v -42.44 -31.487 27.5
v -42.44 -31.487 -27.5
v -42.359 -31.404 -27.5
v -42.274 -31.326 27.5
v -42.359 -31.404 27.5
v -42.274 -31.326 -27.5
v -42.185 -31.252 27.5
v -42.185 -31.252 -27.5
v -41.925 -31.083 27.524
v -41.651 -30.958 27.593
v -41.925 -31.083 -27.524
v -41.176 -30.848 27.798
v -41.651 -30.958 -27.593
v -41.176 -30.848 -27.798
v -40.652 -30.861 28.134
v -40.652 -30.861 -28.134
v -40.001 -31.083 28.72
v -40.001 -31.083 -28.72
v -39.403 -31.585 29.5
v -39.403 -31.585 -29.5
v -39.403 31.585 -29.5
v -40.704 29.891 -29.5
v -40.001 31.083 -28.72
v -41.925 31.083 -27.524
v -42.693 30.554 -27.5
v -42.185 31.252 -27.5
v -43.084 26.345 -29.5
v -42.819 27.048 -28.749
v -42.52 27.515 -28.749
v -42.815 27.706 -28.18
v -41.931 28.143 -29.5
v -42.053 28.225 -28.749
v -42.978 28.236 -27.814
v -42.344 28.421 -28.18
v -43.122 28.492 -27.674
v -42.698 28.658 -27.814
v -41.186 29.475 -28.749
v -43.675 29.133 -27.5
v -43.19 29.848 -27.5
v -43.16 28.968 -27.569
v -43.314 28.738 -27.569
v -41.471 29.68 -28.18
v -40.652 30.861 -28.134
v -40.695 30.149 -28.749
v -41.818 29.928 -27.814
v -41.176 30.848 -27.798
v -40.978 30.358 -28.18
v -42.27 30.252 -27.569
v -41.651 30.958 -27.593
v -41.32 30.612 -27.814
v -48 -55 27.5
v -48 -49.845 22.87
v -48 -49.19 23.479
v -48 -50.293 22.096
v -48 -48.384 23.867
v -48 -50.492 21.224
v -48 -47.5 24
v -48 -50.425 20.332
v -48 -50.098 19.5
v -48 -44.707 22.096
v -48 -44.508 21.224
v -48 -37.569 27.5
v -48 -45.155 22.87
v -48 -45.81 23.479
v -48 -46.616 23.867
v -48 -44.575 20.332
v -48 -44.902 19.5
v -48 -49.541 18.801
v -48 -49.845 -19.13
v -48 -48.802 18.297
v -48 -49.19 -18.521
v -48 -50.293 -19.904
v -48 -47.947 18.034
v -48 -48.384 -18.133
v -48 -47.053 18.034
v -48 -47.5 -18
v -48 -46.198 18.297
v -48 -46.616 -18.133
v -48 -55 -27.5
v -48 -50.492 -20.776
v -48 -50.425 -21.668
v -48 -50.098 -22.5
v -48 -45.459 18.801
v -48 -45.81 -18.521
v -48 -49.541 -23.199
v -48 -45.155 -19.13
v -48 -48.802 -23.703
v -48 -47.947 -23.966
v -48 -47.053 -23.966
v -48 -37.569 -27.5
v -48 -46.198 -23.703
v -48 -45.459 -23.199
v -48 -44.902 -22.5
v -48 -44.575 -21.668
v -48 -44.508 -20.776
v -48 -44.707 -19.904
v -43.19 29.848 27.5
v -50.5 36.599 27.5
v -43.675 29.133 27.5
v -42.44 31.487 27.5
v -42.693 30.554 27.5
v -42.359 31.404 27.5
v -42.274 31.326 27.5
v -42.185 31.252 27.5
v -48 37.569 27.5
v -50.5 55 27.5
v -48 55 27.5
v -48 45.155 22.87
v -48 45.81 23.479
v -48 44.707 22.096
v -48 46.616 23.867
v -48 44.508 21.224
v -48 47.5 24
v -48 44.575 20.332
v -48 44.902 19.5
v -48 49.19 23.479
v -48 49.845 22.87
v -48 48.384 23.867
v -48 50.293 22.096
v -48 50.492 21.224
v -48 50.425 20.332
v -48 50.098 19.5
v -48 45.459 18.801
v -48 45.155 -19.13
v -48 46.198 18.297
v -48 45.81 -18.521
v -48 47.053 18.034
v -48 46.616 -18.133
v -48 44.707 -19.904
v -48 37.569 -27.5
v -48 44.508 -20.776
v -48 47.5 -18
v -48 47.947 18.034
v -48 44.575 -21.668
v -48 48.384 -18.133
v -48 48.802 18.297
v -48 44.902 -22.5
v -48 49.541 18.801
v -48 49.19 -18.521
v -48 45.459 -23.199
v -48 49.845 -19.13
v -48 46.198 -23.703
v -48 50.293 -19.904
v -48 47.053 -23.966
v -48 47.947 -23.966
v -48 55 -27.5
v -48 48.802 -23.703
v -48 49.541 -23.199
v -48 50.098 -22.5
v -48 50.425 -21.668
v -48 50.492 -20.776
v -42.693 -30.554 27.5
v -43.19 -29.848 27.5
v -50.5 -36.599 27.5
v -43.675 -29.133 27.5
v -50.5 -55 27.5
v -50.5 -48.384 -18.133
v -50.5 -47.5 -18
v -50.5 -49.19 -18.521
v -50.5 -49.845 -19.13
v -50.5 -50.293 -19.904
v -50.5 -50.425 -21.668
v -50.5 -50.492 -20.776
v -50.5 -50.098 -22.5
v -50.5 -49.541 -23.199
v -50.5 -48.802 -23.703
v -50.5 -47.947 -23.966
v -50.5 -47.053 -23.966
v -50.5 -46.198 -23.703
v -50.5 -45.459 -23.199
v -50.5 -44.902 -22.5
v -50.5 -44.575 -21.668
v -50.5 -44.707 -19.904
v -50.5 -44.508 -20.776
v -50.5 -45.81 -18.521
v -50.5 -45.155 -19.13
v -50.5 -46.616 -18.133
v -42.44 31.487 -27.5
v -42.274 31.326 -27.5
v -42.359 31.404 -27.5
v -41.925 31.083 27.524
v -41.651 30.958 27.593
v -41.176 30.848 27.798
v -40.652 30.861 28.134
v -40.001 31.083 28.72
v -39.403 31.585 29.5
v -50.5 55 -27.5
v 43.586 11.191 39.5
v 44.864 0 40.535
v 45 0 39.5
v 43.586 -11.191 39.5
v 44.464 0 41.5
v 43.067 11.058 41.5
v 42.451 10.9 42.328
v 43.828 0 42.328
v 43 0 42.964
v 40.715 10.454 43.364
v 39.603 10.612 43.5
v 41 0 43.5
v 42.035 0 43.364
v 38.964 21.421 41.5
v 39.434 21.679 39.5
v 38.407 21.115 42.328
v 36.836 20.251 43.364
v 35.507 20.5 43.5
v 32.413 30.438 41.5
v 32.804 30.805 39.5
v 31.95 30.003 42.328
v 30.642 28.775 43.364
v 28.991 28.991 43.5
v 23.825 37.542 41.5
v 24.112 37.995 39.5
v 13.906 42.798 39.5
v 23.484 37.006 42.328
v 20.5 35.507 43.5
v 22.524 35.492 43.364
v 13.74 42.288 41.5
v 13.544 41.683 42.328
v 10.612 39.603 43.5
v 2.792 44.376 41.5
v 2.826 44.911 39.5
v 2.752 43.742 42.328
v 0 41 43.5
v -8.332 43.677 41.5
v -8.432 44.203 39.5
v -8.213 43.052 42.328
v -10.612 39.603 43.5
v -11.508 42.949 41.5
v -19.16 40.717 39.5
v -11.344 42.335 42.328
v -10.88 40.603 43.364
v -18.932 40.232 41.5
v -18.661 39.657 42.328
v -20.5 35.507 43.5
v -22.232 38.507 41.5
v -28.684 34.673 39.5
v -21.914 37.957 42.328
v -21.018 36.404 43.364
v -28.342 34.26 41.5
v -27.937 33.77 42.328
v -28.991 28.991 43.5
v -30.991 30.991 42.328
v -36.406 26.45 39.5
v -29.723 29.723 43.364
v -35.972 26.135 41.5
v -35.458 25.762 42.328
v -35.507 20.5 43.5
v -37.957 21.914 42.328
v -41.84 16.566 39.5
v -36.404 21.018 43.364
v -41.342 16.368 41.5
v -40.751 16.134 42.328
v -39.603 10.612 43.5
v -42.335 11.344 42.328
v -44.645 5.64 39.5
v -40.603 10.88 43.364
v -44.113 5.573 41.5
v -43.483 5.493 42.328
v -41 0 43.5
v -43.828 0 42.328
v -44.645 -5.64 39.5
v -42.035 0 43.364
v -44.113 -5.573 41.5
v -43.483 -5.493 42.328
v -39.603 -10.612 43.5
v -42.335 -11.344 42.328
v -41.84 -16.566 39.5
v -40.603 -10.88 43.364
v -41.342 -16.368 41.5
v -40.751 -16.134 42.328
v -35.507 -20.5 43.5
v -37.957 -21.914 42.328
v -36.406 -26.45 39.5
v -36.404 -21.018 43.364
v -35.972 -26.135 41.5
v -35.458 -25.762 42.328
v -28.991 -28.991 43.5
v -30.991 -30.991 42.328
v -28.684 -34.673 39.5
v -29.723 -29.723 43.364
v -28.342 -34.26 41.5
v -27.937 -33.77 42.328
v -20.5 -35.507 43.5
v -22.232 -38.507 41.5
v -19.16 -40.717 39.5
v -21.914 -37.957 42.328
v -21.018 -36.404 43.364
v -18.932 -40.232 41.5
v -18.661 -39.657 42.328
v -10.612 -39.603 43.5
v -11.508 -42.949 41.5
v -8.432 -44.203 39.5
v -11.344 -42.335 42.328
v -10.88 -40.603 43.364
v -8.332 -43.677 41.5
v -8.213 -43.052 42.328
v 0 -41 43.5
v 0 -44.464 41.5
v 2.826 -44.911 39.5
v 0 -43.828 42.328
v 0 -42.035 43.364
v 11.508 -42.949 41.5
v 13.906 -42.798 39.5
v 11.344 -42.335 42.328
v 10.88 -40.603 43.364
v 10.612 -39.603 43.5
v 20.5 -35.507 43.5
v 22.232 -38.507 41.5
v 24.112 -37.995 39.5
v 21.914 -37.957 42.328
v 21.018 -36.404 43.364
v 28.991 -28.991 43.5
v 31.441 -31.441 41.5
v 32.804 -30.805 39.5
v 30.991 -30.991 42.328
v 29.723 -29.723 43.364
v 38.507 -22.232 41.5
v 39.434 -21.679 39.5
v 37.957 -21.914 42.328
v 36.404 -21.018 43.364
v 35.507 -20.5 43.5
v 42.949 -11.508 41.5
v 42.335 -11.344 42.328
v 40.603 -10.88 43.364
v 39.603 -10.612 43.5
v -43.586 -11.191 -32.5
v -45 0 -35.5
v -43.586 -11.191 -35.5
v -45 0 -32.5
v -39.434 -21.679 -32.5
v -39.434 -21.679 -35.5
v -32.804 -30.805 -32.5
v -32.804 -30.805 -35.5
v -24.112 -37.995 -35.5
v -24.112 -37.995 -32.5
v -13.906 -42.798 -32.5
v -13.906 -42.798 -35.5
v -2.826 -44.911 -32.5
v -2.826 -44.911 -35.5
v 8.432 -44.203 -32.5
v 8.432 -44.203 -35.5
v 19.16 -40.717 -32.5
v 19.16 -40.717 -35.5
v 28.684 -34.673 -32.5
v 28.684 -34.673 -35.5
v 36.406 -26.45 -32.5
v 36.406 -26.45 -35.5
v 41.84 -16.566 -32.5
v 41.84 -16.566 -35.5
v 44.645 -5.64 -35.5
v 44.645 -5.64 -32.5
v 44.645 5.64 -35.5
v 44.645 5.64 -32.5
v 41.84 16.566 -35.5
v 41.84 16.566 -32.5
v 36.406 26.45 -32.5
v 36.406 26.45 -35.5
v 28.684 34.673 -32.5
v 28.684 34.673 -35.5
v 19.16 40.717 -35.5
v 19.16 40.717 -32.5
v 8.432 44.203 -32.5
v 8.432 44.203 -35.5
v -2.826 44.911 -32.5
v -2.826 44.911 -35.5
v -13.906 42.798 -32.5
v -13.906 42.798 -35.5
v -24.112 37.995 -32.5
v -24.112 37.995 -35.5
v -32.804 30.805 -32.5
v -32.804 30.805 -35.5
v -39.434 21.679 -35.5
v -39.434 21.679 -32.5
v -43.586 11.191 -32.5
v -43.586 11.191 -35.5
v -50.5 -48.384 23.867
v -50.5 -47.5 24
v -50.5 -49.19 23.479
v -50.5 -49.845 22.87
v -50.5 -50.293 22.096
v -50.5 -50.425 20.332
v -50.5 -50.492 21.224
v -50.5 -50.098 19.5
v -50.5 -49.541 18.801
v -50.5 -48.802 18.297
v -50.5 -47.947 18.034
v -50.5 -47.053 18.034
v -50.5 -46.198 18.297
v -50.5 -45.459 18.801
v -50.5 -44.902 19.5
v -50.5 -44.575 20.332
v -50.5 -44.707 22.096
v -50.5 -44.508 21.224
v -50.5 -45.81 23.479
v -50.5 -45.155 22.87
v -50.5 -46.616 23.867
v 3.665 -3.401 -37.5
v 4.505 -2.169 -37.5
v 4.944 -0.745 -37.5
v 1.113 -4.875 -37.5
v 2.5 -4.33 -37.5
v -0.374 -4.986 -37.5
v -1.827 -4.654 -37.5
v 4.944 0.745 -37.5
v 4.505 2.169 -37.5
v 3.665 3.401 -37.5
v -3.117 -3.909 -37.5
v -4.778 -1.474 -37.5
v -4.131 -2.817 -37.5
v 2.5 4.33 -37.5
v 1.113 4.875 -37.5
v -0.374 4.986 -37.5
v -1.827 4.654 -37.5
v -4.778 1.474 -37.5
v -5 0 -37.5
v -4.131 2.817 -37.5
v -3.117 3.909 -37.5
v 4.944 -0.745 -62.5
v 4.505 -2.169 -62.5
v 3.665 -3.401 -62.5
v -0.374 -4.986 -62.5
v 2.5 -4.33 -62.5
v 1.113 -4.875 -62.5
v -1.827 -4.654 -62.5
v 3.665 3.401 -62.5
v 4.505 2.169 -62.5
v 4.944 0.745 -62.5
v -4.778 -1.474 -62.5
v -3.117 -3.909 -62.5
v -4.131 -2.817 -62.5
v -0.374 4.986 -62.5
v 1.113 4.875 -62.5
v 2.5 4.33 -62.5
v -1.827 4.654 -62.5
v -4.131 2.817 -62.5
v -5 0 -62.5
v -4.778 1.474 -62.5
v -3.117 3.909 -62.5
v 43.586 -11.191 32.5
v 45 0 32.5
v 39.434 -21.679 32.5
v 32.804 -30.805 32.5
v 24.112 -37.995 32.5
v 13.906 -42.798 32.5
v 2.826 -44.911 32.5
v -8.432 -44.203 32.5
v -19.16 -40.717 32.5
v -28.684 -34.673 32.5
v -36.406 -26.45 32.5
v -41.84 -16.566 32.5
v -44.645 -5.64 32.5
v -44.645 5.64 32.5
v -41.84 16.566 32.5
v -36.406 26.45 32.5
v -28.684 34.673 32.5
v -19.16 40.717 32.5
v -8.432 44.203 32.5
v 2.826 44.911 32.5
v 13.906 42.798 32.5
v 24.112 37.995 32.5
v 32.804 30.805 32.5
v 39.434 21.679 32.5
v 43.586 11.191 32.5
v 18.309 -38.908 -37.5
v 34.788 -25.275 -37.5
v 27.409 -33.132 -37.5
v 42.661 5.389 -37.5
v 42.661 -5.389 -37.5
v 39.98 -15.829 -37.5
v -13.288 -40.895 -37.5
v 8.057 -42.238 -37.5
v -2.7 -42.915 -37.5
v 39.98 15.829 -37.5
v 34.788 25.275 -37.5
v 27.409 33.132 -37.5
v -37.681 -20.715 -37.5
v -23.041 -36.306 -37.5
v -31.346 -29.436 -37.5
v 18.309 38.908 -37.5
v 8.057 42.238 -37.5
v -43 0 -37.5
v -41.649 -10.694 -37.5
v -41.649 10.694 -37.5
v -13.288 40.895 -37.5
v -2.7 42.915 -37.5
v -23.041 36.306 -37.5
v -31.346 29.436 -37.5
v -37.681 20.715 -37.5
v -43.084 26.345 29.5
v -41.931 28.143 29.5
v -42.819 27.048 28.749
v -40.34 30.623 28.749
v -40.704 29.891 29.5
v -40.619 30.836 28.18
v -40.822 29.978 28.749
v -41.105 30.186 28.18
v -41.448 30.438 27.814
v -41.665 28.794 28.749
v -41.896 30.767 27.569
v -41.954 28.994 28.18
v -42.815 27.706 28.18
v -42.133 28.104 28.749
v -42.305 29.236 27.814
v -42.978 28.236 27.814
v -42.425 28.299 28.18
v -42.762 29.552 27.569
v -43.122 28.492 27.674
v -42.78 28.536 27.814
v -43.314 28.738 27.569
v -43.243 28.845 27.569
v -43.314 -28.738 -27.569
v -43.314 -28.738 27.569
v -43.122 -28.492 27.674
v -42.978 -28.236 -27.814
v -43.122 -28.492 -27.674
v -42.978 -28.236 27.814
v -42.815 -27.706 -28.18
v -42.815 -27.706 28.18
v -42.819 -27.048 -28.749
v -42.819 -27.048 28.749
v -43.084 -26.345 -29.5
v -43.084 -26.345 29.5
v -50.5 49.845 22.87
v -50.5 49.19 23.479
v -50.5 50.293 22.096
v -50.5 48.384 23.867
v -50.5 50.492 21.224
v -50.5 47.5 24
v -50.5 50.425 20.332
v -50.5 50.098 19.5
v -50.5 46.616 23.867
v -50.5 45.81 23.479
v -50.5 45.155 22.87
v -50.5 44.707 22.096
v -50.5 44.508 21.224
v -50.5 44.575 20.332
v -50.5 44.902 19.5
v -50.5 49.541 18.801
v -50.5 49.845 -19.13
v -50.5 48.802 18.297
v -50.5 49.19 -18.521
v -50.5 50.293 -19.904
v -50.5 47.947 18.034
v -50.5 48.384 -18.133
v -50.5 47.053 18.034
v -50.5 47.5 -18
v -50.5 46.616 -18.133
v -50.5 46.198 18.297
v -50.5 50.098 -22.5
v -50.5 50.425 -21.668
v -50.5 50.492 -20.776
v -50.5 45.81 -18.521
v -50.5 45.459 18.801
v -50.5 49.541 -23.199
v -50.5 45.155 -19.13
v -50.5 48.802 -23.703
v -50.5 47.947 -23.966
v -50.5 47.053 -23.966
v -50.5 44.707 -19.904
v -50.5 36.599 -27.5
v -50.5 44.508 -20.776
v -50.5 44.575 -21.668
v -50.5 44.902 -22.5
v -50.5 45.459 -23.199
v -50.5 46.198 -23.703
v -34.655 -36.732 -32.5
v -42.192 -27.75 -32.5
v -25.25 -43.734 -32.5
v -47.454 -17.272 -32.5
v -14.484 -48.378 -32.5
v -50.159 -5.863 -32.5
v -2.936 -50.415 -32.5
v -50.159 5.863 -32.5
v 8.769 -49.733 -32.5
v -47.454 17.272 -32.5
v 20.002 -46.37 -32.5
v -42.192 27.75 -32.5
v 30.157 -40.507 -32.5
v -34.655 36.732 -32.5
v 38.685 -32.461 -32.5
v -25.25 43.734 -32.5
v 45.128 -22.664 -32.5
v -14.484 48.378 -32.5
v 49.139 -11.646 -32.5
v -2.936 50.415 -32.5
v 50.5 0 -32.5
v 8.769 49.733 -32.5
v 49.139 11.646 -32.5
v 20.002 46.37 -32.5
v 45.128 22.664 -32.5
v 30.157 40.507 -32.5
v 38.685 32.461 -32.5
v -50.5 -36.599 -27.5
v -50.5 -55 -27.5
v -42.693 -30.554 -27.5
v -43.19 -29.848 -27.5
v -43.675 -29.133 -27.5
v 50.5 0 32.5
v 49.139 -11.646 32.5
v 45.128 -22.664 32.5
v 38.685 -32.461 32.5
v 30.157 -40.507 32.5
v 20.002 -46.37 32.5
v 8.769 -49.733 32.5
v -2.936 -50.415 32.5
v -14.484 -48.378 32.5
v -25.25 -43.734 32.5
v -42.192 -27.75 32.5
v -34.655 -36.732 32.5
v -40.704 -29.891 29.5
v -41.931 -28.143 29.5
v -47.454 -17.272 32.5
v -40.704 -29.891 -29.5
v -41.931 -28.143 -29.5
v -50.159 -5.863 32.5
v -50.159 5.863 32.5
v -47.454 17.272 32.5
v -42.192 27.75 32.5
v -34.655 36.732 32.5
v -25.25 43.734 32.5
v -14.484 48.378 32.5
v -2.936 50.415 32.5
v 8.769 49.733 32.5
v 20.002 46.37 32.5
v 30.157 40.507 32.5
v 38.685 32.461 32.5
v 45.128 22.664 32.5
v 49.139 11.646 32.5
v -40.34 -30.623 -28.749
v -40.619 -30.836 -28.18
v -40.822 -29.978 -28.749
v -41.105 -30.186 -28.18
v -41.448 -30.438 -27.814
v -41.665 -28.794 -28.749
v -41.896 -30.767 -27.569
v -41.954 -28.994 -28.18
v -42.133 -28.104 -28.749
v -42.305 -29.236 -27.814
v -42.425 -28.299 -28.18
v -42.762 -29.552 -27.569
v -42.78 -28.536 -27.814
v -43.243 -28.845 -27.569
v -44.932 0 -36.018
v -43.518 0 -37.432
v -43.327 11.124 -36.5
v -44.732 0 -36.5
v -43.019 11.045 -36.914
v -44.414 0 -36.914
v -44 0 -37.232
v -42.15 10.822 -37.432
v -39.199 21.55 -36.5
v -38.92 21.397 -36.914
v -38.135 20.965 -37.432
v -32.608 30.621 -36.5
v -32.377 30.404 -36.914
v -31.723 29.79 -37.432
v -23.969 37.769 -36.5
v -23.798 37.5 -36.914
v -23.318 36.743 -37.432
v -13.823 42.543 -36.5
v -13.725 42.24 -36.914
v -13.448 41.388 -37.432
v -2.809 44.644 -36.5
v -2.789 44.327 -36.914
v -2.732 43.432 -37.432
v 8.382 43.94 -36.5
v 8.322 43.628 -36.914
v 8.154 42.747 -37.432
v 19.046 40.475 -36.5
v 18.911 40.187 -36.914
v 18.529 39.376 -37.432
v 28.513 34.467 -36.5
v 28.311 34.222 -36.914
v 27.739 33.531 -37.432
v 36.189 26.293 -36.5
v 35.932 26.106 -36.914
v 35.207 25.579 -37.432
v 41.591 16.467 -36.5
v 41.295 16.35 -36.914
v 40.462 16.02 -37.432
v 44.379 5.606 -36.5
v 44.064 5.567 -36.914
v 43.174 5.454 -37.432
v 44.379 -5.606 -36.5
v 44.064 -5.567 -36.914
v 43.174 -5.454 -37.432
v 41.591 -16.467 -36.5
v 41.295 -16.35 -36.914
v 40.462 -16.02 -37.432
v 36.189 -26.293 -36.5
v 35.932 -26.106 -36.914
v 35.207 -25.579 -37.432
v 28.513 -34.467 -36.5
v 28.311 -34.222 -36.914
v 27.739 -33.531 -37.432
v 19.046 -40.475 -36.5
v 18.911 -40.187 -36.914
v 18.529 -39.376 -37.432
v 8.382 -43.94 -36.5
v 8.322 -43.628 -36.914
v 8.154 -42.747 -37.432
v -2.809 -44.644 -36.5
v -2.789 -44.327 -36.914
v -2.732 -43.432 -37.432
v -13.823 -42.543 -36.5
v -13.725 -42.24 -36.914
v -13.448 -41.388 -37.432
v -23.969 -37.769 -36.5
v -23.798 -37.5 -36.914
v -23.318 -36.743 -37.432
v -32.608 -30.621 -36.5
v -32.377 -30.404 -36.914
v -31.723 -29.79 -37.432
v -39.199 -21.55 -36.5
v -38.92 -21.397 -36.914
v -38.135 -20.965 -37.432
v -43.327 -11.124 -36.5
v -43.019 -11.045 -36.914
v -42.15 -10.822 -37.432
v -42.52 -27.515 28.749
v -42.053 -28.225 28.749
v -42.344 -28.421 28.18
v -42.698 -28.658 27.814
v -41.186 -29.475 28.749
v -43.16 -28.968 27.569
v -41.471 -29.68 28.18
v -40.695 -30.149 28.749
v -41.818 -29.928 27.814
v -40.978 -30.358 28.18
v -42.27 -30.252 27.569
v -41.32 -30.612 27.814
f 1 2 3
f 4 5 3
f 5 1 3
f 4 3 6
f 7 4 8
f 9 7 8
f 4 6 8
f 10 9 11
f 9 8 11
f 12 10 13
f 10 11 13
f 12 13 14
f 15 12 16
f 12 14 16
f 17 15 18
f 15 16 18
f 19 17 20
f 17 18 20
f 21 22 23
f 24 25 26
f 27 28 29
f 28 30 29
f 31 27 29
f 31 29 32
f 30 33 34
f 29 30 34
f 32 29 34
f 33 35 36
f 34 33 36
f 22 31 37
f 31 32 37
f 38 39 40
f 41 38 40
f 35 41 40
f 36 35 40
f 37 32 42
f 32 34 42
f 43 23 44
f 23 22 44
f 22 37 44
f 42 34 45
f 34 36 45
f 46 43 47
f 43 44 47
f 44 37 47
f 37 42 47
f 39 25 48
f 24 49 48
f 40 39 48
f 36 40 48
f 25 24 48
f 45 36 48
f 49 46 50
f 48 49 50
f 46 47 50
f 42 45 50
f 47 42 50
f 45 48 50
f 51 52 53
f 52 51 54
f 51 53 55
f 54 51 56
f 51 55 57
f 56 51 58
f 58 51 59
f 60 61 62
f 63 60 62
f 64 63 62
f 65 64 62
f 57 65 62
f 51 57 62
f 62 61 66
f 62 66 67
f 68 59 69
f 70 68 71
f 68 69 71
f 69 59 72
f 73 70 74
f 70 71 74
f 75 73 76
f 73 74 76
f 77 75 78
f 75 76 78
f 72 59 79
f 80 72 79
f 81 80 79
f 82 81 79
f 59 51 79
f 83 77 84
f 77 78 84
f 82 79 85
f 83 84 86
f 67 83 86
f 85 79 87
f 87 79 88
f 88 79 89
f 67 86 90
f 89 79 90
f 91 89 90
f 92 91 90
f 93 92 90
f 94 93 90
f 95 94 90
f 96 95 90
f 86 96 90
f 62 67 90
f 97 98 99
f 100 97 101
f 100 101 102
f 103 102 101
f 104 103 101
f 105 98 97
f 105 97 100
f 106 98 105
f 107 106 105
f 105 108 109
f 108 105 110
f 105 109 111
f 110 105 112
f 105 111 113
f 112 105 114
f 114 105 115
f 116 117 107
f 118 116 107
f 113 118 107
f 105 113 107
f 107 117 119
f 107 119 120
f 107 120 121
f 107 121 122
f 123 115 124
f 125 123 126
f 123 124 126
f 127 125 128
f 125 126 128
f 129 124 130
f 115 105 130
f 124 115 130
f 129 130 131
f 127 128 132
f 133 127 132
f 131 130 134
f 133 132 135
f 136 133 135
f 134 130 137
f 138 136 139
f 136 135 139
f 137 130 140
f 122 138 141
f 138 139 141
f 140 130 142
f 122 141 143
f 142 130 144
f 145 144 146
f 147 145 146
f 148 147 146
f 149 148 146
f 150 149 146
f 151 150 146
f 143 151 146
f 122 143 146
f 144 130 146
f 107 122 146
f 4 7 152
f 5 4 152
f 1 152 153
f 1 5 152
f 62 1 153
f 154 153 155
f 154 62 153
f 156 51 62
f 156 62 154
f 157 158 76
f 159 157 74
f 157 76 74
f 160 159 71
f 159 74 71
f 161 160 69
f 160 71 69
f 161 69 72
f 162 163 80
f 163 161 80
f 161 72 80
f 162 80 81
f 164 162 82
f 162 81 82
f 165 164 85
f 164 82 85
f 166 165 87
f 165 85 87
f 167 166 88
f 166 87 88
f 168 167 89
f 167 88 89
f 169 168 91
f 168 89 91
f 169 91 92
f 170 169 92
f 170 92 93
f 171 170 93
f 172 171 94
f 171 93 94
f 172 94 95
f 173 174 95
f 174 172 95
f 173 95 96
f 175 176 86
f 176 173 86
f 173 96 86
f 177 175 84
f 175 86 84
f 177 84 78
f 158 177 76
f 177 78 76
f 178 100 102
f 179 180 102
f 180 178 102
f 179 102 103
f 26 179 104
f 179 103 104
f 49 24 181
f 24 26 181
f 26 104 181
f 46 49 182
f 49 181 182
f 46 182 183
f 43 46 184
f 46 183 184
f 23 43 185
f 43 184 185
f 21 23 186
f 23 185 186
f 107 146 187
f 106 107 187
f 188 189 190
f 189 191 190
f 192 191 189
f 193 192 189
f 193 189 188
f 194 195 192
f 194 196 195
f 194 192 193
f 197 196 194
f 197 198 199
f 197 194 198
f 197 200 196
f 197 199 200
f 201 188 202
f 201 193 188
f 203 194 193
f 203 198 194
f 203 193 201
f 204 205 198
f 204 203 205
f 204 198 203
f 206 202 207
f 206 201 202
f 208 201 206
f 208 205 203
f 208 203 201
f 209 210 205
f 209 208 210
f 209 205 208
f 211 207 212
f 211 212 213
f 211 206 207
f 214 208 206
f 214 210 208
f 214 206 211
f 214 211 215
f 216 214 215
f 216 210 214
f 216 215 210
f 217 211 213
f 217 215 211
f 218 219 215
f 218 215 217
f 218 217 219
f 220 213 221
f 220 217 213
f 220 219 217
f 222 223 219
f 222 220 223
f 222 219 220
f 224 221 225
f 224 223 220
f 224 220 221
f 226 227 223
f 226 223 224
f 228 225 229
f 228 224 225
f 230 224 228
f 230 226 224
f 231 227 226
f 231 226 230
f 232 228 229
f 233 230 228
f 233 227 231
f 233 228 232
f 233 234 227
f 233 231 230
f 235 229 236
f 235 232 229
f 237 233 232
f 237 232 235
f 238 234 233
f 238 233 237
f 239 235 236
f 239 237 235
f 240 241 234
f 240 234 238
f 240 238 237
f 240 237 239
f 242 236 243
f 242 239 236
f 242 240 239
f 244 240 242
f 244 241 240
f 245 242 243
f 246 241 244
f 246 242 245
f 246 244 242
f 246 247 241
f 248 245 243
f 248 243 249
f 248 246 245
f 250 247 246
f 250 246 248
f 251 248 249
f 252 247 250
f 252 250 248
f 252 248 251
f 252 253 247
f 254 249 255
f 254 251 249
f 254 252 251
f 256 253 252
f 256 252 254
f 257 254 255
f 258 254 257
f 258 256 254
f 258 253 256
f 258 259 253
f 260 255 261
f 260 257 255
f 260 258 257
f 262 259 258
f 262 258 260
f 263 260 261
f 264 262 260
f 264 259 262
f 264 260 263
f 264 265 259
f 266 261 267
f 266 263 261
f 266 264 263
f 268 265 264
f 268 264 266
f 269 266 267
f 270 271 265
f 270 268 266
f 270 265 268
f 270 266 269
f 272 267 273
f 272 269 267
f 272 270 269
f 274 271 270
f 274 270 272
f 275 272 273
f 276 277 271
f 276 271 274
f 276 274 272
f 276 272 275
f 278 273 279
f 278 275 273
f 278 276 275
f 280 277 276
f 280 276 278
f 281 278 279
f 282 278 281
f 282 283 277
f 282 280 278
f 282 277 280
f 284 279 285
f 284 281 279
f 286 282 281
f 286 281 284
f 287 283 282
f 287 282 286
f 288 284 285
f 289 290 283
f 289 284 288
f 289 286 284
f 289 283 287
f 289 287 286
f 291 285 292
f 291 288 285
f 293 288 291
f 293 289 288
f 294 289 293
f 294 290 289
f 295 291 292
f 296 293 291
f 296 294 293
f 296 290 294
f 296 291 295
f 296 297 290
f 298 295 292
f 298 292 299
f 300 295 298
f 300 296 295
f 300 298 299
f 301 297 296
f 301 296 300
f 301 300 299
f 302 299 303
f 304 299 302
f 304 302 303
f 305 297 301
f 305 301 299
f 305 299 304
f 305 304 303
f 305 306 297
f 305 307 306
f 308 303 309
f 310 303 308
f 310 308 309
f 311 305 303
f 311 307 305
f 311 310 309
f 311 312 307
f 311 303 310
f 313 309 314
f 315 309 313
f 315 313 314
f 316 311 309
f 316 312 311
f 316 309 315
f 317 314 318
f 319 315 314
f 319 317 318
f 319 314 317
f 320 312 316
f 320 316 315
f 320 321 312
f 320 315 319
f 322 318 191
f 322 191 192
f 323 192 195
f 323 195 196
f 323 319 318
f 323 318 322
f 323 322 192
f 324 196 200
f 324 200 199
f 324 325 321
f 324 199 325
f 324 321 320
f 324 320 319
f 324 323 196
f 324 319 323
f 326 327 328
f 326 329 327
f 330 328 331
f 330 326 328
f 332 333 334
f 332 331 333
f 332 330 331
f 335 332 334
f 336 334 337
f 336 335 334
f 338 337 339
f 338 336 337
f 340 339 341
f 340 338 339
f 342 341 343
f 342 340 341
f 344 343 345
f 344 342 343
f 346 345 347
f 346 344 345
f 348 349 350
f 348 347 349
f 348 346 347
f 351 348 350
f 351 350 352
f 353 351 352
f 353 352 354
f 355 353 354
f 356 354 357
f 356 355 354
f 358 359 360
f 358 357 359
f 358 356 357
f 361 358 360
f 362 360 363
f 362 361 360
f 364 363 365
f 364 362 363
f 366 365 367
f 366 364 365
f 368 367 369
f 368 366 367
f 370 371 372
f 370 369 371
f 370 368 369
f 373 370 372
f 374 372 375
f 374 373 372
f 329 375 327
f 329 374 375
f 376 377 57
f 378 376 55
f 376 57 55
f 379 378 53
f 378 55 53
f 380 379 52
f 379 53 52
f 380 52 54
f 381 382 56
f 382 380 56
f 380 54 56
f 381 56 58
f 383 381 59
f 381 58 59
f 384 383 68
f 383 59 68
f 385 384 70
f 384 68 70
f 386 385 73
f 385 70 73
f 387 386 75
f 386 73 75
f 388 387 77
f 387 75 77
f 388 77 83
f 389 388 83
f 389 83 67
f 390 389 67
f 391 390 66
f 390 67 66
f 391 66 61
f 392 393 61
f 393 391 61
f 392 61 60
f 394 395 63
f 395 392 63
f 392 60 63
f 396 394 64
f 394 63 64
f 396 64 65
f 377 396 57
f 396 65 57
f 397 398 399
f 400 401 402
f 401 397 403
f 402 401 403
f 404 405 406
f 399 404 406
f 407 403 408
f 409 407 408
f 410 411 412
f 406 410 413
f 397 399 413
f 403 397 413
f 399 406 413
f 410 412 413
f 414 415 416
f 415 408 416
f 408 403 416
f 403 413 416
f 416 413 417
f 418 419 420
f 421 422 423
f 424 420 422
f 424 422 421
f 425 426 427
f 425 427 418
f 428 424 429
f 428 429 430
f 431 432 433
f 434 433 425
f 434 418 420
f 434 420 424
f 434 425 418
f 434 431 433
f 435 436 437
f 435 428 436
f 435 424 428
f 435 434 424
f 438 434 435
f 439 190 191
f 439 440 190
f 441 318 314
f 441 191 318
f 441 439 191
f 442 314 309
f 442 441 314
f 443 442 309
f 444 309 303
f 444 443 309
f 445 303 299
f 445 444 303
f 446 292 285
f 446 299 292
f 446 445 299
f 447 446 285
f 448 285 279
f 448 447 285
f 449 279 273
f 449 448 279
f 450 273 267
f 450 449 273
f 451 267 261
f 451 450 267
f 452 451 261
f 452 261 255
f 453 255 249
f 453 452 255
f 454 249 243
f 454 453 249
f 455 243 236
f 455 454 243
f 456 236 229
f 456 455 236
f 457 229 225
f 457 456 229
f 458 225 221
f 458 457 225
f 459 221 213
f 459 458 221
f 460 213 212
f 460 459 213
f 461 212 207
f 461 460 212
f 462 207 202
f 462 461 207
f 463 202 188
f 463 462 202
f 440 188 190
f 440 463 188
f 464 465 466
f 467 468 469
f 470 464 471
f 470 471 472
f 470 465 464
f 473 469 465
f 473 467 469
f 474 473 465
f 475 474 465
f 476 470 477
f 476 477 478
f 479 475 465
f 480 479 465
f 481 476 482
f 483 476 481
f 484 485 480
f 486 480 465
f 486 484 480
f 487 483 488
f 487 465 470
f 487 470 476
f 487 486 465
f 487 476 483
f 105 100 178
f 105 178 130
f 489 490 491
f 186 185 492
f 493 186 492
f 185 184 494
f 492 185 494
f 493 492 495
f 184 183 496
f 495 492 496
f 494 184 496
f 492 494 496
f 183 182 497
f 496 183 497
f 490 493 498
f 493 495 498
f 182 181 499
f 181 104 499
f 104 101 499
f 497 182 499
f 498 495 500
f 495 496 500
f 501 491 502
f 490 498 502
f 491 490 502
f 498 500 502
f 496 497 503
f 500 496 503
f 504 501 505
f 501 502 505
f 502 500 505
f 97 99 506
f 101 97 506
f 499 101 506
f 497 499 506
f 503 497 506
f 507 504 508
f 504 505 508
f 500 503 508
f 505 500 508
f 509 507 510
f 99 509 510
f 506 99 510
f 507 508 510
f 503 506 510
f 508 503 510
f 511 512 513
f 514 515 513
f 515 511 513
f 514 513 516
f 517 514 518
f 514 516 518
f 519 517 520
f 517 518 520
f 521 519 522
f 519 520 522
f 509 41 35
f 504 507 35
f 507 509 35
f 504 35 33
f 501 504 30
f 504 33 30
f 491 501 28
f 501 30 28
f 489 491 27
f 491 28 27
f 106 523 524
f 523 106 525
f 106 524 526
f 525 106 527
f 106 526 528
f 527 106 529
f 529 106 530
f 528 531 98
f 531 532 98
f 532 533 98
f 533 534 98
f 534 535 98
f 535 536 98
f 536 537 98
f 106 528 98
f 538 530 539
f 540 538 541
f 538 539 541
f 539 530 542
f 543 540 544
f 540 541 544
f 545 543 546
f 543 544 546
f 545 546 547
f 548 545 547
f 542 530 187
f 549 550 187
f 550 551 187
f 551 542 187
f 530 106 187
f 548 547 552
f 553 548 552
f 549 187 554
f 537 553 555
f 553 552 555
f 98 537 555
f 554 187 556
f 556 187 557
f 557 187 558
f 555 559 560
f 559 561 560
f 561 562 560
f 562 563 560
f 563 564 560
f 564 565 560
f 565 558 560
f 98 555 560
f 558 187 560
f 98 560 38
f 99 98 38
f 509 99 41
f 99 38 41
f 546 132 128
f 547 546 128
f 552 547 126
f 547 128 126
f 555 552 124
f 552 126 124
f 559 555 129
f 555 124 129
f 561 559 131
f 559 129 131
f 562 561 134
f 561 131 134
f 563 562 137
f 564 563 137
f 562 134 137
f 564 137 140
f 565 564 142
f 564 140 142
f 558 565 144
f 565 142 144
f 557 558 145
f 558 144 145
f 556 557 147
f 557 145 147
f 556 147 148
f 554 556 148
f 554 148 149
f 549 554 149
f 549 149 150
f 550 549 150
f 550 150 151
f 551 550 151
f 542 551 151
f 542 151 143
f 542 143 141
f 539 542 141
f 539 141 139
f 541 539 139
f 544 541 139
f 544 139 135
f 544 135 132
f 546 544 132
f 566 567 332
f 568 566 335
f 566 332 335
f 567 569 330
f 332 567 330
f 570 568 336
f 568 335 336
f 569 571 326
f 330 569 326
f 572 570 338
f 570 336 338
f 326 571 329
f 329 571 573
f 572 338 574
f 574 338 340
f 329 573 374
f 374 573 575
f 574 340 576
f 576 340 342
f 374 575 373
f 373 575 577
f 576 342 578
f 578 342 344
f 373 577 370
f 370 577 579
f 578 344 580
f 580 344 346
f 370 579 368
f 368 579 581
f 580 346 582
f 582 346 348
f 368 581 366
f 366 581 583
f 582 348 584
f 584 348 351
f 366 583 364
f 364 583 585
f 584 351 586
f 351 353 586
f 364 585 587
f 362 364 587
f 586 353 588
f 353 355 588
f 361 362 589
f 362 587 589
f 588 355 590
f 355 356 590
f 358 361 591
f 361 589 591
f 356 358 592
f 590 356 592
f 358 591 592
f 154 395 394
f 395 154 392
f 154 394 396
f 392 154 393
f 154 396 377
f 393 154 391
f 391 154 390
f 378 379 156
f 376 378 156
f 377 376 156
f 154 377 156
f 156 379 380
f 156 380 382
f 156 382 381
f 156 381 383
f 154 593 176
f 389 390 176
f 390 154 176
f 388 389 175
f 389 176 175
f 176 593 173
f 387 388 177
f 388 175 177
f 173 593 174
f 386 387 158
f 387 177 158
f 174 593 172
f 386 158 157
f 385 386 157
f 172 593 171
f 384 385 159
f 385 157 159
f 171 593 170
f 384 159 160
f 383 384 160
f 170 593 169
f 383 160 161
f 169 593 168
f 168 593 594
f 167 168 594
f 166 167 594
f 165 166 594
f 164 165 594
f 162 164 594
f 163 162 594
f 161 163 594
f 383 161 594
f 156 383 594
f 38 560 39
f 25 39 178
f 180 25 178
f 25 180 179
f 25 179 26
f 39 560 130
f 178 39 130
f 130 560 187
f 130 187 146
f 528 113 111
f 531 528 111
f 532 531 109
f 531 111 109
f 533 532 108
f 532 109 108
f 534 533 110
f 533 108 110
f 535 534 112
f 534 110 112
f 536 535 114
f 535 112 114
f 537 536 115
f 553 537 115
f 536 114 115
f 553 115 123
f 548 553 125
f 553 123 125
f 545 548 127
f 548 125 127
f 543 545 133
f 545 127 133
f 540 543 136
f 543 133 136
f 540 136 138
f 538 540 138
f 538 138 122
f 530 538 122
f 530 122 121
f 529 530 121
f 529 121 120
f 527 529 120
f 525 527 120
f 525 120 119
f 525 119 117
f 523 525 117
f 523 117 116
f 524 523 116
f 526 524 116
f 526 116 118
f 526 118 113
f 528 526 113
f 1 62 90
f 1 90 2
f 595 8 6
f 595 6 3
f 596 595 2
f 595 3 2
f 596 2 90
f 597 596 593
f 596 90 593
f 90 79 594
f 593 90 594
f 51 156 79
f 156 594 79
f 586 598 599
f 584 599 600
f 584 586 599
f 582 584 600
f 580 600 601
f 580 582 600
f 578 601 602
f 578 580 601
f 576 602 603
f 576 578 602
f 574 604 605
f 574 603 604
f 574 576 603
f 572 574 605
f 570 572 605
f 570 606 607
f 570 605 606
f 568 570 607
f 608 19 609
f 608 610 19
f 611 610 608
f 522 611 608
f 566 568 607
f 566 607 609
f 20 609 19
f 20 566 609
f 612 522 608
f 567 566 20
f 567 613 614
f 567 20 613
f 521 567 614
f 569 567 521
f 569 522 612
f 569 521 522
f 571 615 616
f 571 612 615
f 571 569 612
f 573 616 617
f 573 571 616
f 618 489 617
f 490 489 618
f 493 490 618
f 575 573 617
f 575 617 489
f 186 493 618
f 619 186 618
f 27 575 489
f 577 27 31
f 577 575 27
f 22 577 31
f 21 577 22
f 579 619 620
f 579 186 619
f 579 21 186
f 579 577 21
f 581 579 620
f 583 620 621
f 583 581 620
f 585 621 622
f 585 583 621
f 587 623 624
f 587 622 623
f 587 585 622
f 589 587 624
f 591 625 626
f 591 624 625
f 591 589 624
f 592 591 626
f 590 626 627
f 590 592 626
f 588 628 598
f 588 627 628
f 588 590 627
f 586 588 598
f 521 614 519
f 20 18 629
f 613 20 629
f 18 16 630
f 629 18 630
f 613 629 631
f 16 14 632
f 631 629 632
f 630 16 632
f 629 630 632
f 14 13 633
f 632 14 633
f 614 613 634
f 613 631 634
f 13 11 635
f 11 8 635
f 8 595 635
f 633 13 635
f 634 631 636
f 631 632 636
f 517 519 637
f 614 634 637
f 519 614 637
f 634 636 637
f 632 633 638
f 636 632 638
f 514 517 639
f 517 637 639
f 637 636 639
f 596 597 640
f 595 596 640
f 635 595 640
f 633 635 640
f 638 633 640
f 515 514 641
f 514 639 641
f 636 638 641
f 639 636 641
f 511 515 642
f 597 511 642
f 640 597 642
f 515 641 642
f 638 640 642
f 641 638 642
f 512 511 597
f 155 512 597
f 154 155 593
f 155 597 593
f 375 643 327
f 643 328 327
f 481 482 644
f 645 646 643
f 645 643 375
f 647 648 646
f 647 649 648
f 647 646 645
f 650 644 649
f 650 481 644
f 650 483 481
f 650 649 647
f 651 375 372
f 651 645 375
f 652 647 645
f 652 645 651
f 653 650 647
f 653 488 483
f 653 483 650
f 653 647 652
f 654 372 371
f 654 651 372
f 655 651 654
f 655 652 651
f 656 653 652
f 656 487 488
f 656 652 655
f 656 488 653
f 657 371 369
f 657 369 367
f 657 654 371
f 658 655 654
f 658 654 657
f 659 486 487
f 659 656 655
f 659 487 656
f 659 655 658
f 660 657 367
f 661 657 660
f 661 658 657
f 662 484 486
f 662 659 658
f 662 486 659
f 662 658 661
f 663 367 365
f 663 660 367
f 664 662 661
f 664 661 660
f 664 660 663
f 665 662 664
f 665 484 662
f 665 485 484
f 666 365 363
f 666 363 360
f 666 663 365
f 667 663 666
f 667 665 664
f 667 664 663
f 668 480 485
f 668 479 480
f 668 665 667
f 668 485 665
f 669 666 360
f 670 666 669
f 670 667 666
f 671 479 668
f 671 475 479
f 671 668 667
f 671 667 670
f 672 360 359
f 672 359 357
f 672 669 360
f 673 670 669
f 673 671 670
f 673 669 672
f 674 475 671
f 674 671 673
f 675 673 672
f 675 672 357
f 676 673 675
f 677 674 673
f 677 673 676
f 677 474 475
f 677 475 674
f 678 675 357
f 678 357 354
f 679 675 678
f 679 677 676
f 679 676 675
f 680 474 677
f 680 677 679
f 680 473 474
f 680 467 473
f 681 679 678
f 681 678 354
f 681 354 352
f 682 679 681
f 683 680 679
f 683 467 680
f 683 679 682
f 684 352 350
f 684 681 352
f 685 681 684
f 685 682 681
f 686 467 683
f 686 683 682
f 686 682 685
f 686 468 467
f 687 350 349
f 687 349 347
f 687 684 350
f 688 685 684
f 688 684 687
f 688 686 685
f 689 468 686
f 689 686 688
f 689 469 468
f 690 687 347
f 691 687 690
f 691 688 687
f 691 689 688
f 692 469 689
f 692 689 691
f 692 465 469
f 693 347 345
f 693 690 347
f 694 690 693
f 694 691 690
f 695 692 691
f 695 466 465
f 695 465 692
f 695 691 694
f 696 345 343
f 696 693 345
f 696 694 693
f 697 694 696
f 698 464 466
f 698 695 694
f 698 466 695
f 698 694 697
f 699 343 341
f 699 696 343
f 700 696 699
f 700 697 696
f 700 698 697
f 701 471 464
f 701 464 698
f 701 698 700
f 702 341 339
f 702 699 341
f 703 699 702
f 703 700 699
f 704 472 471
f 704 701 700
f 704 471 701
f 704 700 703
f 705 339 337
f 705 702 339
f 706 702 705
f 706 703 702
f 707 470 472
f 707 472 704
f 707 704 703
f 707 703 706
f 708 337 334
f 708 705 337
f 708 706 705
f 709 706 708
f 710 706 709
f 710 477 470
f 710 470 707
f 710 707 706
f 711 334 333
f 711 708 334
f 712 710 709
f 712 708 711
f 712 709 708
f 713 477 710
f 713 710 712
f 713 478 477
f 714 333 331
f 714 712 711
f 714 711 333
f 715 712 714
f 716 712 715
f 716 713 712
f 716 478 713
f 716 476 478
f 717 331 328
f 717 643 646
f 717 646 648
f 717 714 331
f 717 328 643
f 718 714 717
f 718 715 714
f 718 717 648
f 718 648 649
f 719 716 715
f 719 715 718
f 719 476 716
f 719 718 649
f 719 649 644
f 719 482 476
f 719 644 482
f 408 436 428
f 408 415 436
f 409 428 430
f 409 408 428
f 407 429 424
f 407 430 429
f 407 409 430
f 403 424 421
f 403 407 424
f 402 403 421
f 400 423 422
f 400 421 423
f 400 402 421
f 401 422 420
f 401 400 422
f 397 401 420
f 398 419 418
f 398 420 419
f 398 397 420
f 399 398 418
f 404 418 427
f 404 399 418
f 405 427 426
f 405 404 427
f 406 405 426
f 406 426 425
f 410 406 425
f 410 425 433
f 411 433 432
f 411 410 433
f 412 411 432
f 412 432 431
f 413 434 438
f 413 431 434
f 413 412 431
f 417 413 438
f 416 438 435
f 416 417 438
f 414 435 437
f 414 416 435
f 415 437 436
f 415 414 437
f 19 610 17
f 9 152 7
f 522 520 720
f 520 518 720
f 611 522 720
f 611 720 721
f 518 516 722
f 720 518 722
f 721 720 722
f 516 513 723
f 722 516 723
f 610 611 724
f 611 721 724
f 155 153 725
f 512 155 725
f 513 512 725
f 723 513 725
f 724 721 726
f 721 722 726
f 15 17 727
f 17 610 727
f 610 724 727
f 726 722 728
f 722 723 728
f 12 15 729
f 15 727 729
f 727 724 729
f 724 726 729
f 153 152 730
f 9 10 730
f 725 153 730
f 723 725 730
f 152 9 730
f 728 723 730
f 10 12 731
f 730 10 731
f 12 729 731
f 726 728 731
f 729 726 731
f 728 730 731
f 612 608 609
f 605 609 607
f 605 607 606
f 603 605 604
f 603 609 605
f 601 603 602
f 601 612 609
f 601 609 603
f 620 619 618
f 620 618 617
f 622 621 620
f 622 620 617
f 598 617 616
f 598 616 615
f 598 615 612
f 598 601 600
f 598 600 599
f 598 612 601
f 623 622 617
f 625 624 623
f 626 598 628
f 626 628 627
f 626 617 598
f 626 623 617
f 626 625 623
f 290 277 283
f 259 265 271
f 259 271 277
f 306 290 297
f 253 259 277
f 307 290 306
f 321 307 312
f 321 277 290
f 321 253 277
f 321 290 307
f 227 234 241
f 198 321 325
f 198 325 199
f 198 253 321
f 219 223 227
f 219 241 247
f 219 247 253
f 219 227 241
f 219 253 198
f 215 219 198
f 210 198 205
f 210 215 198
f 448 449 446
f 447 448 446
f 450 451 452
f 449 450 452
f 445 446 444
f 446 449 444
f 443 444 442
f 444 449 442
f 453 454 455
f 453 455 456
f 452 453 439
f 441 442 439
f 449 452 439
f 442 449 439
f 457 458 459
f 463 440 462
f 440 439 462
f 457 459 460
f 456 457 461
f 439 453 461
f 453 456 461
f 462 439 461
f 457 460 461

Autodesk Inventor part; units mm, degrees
ref_plane "YZ Plane" through (0, 0, 0) normal (1, 0, 0) x (0, 1, 0)
ref_plane "XZ Plane" through (0, 0, 0) normal (0, 1, 0) x (-1, 0, 0)
ref_plane "XY Plane" through (0, 0, 0) normal (0, 0, 1) x (1, 0, 0)
sketch "Sketch1" plane through (0, 0, 0) normal (0, 0, 1) x (1, 0, 0)
  circle A0 centre (0, 0) radius 50.5
  dimension "d0" = 101
sketch "Sketch1 outline for Extrusion1" plane through (0, 0, 0) normal (0, 0, 1) x (1, 0, 0)
  circle A0 centre (0, 0) radius 50.5
extrude "Extrusion1" add sketch "Sketch1 outline for Extrusion1" along normal mid plane 65
sketch "Sketch2" plane through (0, 0, 32.5) normal (0, 0, 1) x (1, 0, 0)
  circle A0 centre (0, 0) radius 45
  dimension "d3" = 90
sketch "Sketch2 outline for Extrusion2" plane through (0, 0, 32.5) normal (0, 0, 1) x (1, 0, 0)
  circle A0 centre (0, 0) radius 45
extrude "Extrusion2" add sketch "Sketch2 outline for Extrusion2" along normal blind 11 separate body
sketch "Sketch3" plane through (0, 0, -32.5) normal (0, 0, -1) x (-1, 0, 0)
  circle A0 centre (0, 0) radius 45
  dimension "d6" = 90
sketch "Sketch3 outline for Extrusion3" plane through (0, 0, -32.5) normal (0, 0, -1) x (-1, 0, 0)
  circle A0 centre (0, 0) radius 45
extrude "Extrusion3" add sketch "Sketch3 outline for Extrusion3" along normal blind 5 bodies 1
sketch "Sketch4" plane through (0, 0, 0) normal (0, 0, 1) x (1, 0, 0)
  line L0 (-50.5, 36.598952) -> (-50.5, 55)
  line L1 (-50.5, 55) -> (-48, 55)
  line L2 (-48, 55) -> (-48, 37.569428)
  line L3 (-48, 37.569428) -> (-40.826794, 29.72243)
  circle A0 centre (0, 0) radius 50.5
  line L4 (-50.5, 36.598952) -> (-42.283548, 27.610714)
  dimension "d9" = 55
  dimension "d10" = 2.5
  dimension "d11" = 2.5
  dimension "d12" = 18.40105
  dimension "d13" = 17.43057
sketch "Sketch4 outline for Extrusion4" plane through (0, 0, 0) normal (0, 0, 1) x (1, 0, 0)
  line L0 (-50.5, 55) -> (-50.5, 36.598952)
  line L1 (-48, 55) -> (-50.5, 55)
  line L2 (-48, 37.569428) -> (-48, 55)
  line L3 (-40.826794, 29.72243) -> (-48, 37.569428)
  arc A0 (-42.283548, 27.610714) -> (-40.826794, 29.72243) centre (0, 0) cw
  line L4 (-50.5, 36.598952) -> (-42.283548, 27.610714)
extrude "Extrusion4" add sketch "Sketch4 outline for Extrusion4" along normal mid plane 55 bodies 1
mirror "Mirror1" about plane through (0, 0, 0) normal (0, 1, 0) of "Extrusion4" bodies 1
sketch "Sketch5" plane through (-50.5, 36.598952, 27.5) normal (-1, 0, 0) x (0, 0, 1)
  line L0 (-27.5, 52.121928) -> (-27.5, -131.017503) construction
  point P0 (-27.5, -36.598952)
  point P1 (-6.5, 10.901048)
  point P2 (-48.5, 10.901048)
  dimension "d16" = 42
  dimension "d17" = 47.5
hole "Hole1" at (-50.5, 47.5, 21) at (-50.5, 47.5, -21) direction (1, 0, 0) diameter 6 depth 4.825 bodies 1
mirror "Mirror2" about plane through (0, 0, 0) normal (0, 1, 0) of "Hole1" bodies 1
sketch "Sketch6" plane through (0, 0, -37.5) normal (0, 0, -1) x (-1, 0, 0)
  point P0 (0, 0)
sketch "Sketch7" plane through (0, 0, -37.5) normal (0, 0, -1) x (-1, 0, 0)
  circle A0 centre (0, 0) radius 5
  dimension "d25" = 10
sketch "Sketch7 outline for Extrusion5" plane through (0, 0, -37.5) normal (0, 0, -1) x (-1, 0, 0)
  circle A0 centre (0, 0) radius 5
extrude "Extrusion5" add sketch "Sketch7 outline for Extrusion5" along normal blind 25 separate body
fillet "Fillet1" radius 4 1 edges at (-45, 0, 43.5)
fillet "Fillet3" radius 2 8 edges at (-42.2835, 27.6107, 0) (-40.8268, -29.7224, 0) (-42.2835, -27.6107, 0) (-40.8268, 29.7224, 0) (-41.5686, 28.6758, 27.5) (-41.5686, -28.6758, 27.5) (-41.5686, 28.6758, -27.5) (-41.5686, -28.6758, -27.5)
fillet "Fillet4" radius 2 1 edges at (45, 0, -37.5)
properties part number "motor"
